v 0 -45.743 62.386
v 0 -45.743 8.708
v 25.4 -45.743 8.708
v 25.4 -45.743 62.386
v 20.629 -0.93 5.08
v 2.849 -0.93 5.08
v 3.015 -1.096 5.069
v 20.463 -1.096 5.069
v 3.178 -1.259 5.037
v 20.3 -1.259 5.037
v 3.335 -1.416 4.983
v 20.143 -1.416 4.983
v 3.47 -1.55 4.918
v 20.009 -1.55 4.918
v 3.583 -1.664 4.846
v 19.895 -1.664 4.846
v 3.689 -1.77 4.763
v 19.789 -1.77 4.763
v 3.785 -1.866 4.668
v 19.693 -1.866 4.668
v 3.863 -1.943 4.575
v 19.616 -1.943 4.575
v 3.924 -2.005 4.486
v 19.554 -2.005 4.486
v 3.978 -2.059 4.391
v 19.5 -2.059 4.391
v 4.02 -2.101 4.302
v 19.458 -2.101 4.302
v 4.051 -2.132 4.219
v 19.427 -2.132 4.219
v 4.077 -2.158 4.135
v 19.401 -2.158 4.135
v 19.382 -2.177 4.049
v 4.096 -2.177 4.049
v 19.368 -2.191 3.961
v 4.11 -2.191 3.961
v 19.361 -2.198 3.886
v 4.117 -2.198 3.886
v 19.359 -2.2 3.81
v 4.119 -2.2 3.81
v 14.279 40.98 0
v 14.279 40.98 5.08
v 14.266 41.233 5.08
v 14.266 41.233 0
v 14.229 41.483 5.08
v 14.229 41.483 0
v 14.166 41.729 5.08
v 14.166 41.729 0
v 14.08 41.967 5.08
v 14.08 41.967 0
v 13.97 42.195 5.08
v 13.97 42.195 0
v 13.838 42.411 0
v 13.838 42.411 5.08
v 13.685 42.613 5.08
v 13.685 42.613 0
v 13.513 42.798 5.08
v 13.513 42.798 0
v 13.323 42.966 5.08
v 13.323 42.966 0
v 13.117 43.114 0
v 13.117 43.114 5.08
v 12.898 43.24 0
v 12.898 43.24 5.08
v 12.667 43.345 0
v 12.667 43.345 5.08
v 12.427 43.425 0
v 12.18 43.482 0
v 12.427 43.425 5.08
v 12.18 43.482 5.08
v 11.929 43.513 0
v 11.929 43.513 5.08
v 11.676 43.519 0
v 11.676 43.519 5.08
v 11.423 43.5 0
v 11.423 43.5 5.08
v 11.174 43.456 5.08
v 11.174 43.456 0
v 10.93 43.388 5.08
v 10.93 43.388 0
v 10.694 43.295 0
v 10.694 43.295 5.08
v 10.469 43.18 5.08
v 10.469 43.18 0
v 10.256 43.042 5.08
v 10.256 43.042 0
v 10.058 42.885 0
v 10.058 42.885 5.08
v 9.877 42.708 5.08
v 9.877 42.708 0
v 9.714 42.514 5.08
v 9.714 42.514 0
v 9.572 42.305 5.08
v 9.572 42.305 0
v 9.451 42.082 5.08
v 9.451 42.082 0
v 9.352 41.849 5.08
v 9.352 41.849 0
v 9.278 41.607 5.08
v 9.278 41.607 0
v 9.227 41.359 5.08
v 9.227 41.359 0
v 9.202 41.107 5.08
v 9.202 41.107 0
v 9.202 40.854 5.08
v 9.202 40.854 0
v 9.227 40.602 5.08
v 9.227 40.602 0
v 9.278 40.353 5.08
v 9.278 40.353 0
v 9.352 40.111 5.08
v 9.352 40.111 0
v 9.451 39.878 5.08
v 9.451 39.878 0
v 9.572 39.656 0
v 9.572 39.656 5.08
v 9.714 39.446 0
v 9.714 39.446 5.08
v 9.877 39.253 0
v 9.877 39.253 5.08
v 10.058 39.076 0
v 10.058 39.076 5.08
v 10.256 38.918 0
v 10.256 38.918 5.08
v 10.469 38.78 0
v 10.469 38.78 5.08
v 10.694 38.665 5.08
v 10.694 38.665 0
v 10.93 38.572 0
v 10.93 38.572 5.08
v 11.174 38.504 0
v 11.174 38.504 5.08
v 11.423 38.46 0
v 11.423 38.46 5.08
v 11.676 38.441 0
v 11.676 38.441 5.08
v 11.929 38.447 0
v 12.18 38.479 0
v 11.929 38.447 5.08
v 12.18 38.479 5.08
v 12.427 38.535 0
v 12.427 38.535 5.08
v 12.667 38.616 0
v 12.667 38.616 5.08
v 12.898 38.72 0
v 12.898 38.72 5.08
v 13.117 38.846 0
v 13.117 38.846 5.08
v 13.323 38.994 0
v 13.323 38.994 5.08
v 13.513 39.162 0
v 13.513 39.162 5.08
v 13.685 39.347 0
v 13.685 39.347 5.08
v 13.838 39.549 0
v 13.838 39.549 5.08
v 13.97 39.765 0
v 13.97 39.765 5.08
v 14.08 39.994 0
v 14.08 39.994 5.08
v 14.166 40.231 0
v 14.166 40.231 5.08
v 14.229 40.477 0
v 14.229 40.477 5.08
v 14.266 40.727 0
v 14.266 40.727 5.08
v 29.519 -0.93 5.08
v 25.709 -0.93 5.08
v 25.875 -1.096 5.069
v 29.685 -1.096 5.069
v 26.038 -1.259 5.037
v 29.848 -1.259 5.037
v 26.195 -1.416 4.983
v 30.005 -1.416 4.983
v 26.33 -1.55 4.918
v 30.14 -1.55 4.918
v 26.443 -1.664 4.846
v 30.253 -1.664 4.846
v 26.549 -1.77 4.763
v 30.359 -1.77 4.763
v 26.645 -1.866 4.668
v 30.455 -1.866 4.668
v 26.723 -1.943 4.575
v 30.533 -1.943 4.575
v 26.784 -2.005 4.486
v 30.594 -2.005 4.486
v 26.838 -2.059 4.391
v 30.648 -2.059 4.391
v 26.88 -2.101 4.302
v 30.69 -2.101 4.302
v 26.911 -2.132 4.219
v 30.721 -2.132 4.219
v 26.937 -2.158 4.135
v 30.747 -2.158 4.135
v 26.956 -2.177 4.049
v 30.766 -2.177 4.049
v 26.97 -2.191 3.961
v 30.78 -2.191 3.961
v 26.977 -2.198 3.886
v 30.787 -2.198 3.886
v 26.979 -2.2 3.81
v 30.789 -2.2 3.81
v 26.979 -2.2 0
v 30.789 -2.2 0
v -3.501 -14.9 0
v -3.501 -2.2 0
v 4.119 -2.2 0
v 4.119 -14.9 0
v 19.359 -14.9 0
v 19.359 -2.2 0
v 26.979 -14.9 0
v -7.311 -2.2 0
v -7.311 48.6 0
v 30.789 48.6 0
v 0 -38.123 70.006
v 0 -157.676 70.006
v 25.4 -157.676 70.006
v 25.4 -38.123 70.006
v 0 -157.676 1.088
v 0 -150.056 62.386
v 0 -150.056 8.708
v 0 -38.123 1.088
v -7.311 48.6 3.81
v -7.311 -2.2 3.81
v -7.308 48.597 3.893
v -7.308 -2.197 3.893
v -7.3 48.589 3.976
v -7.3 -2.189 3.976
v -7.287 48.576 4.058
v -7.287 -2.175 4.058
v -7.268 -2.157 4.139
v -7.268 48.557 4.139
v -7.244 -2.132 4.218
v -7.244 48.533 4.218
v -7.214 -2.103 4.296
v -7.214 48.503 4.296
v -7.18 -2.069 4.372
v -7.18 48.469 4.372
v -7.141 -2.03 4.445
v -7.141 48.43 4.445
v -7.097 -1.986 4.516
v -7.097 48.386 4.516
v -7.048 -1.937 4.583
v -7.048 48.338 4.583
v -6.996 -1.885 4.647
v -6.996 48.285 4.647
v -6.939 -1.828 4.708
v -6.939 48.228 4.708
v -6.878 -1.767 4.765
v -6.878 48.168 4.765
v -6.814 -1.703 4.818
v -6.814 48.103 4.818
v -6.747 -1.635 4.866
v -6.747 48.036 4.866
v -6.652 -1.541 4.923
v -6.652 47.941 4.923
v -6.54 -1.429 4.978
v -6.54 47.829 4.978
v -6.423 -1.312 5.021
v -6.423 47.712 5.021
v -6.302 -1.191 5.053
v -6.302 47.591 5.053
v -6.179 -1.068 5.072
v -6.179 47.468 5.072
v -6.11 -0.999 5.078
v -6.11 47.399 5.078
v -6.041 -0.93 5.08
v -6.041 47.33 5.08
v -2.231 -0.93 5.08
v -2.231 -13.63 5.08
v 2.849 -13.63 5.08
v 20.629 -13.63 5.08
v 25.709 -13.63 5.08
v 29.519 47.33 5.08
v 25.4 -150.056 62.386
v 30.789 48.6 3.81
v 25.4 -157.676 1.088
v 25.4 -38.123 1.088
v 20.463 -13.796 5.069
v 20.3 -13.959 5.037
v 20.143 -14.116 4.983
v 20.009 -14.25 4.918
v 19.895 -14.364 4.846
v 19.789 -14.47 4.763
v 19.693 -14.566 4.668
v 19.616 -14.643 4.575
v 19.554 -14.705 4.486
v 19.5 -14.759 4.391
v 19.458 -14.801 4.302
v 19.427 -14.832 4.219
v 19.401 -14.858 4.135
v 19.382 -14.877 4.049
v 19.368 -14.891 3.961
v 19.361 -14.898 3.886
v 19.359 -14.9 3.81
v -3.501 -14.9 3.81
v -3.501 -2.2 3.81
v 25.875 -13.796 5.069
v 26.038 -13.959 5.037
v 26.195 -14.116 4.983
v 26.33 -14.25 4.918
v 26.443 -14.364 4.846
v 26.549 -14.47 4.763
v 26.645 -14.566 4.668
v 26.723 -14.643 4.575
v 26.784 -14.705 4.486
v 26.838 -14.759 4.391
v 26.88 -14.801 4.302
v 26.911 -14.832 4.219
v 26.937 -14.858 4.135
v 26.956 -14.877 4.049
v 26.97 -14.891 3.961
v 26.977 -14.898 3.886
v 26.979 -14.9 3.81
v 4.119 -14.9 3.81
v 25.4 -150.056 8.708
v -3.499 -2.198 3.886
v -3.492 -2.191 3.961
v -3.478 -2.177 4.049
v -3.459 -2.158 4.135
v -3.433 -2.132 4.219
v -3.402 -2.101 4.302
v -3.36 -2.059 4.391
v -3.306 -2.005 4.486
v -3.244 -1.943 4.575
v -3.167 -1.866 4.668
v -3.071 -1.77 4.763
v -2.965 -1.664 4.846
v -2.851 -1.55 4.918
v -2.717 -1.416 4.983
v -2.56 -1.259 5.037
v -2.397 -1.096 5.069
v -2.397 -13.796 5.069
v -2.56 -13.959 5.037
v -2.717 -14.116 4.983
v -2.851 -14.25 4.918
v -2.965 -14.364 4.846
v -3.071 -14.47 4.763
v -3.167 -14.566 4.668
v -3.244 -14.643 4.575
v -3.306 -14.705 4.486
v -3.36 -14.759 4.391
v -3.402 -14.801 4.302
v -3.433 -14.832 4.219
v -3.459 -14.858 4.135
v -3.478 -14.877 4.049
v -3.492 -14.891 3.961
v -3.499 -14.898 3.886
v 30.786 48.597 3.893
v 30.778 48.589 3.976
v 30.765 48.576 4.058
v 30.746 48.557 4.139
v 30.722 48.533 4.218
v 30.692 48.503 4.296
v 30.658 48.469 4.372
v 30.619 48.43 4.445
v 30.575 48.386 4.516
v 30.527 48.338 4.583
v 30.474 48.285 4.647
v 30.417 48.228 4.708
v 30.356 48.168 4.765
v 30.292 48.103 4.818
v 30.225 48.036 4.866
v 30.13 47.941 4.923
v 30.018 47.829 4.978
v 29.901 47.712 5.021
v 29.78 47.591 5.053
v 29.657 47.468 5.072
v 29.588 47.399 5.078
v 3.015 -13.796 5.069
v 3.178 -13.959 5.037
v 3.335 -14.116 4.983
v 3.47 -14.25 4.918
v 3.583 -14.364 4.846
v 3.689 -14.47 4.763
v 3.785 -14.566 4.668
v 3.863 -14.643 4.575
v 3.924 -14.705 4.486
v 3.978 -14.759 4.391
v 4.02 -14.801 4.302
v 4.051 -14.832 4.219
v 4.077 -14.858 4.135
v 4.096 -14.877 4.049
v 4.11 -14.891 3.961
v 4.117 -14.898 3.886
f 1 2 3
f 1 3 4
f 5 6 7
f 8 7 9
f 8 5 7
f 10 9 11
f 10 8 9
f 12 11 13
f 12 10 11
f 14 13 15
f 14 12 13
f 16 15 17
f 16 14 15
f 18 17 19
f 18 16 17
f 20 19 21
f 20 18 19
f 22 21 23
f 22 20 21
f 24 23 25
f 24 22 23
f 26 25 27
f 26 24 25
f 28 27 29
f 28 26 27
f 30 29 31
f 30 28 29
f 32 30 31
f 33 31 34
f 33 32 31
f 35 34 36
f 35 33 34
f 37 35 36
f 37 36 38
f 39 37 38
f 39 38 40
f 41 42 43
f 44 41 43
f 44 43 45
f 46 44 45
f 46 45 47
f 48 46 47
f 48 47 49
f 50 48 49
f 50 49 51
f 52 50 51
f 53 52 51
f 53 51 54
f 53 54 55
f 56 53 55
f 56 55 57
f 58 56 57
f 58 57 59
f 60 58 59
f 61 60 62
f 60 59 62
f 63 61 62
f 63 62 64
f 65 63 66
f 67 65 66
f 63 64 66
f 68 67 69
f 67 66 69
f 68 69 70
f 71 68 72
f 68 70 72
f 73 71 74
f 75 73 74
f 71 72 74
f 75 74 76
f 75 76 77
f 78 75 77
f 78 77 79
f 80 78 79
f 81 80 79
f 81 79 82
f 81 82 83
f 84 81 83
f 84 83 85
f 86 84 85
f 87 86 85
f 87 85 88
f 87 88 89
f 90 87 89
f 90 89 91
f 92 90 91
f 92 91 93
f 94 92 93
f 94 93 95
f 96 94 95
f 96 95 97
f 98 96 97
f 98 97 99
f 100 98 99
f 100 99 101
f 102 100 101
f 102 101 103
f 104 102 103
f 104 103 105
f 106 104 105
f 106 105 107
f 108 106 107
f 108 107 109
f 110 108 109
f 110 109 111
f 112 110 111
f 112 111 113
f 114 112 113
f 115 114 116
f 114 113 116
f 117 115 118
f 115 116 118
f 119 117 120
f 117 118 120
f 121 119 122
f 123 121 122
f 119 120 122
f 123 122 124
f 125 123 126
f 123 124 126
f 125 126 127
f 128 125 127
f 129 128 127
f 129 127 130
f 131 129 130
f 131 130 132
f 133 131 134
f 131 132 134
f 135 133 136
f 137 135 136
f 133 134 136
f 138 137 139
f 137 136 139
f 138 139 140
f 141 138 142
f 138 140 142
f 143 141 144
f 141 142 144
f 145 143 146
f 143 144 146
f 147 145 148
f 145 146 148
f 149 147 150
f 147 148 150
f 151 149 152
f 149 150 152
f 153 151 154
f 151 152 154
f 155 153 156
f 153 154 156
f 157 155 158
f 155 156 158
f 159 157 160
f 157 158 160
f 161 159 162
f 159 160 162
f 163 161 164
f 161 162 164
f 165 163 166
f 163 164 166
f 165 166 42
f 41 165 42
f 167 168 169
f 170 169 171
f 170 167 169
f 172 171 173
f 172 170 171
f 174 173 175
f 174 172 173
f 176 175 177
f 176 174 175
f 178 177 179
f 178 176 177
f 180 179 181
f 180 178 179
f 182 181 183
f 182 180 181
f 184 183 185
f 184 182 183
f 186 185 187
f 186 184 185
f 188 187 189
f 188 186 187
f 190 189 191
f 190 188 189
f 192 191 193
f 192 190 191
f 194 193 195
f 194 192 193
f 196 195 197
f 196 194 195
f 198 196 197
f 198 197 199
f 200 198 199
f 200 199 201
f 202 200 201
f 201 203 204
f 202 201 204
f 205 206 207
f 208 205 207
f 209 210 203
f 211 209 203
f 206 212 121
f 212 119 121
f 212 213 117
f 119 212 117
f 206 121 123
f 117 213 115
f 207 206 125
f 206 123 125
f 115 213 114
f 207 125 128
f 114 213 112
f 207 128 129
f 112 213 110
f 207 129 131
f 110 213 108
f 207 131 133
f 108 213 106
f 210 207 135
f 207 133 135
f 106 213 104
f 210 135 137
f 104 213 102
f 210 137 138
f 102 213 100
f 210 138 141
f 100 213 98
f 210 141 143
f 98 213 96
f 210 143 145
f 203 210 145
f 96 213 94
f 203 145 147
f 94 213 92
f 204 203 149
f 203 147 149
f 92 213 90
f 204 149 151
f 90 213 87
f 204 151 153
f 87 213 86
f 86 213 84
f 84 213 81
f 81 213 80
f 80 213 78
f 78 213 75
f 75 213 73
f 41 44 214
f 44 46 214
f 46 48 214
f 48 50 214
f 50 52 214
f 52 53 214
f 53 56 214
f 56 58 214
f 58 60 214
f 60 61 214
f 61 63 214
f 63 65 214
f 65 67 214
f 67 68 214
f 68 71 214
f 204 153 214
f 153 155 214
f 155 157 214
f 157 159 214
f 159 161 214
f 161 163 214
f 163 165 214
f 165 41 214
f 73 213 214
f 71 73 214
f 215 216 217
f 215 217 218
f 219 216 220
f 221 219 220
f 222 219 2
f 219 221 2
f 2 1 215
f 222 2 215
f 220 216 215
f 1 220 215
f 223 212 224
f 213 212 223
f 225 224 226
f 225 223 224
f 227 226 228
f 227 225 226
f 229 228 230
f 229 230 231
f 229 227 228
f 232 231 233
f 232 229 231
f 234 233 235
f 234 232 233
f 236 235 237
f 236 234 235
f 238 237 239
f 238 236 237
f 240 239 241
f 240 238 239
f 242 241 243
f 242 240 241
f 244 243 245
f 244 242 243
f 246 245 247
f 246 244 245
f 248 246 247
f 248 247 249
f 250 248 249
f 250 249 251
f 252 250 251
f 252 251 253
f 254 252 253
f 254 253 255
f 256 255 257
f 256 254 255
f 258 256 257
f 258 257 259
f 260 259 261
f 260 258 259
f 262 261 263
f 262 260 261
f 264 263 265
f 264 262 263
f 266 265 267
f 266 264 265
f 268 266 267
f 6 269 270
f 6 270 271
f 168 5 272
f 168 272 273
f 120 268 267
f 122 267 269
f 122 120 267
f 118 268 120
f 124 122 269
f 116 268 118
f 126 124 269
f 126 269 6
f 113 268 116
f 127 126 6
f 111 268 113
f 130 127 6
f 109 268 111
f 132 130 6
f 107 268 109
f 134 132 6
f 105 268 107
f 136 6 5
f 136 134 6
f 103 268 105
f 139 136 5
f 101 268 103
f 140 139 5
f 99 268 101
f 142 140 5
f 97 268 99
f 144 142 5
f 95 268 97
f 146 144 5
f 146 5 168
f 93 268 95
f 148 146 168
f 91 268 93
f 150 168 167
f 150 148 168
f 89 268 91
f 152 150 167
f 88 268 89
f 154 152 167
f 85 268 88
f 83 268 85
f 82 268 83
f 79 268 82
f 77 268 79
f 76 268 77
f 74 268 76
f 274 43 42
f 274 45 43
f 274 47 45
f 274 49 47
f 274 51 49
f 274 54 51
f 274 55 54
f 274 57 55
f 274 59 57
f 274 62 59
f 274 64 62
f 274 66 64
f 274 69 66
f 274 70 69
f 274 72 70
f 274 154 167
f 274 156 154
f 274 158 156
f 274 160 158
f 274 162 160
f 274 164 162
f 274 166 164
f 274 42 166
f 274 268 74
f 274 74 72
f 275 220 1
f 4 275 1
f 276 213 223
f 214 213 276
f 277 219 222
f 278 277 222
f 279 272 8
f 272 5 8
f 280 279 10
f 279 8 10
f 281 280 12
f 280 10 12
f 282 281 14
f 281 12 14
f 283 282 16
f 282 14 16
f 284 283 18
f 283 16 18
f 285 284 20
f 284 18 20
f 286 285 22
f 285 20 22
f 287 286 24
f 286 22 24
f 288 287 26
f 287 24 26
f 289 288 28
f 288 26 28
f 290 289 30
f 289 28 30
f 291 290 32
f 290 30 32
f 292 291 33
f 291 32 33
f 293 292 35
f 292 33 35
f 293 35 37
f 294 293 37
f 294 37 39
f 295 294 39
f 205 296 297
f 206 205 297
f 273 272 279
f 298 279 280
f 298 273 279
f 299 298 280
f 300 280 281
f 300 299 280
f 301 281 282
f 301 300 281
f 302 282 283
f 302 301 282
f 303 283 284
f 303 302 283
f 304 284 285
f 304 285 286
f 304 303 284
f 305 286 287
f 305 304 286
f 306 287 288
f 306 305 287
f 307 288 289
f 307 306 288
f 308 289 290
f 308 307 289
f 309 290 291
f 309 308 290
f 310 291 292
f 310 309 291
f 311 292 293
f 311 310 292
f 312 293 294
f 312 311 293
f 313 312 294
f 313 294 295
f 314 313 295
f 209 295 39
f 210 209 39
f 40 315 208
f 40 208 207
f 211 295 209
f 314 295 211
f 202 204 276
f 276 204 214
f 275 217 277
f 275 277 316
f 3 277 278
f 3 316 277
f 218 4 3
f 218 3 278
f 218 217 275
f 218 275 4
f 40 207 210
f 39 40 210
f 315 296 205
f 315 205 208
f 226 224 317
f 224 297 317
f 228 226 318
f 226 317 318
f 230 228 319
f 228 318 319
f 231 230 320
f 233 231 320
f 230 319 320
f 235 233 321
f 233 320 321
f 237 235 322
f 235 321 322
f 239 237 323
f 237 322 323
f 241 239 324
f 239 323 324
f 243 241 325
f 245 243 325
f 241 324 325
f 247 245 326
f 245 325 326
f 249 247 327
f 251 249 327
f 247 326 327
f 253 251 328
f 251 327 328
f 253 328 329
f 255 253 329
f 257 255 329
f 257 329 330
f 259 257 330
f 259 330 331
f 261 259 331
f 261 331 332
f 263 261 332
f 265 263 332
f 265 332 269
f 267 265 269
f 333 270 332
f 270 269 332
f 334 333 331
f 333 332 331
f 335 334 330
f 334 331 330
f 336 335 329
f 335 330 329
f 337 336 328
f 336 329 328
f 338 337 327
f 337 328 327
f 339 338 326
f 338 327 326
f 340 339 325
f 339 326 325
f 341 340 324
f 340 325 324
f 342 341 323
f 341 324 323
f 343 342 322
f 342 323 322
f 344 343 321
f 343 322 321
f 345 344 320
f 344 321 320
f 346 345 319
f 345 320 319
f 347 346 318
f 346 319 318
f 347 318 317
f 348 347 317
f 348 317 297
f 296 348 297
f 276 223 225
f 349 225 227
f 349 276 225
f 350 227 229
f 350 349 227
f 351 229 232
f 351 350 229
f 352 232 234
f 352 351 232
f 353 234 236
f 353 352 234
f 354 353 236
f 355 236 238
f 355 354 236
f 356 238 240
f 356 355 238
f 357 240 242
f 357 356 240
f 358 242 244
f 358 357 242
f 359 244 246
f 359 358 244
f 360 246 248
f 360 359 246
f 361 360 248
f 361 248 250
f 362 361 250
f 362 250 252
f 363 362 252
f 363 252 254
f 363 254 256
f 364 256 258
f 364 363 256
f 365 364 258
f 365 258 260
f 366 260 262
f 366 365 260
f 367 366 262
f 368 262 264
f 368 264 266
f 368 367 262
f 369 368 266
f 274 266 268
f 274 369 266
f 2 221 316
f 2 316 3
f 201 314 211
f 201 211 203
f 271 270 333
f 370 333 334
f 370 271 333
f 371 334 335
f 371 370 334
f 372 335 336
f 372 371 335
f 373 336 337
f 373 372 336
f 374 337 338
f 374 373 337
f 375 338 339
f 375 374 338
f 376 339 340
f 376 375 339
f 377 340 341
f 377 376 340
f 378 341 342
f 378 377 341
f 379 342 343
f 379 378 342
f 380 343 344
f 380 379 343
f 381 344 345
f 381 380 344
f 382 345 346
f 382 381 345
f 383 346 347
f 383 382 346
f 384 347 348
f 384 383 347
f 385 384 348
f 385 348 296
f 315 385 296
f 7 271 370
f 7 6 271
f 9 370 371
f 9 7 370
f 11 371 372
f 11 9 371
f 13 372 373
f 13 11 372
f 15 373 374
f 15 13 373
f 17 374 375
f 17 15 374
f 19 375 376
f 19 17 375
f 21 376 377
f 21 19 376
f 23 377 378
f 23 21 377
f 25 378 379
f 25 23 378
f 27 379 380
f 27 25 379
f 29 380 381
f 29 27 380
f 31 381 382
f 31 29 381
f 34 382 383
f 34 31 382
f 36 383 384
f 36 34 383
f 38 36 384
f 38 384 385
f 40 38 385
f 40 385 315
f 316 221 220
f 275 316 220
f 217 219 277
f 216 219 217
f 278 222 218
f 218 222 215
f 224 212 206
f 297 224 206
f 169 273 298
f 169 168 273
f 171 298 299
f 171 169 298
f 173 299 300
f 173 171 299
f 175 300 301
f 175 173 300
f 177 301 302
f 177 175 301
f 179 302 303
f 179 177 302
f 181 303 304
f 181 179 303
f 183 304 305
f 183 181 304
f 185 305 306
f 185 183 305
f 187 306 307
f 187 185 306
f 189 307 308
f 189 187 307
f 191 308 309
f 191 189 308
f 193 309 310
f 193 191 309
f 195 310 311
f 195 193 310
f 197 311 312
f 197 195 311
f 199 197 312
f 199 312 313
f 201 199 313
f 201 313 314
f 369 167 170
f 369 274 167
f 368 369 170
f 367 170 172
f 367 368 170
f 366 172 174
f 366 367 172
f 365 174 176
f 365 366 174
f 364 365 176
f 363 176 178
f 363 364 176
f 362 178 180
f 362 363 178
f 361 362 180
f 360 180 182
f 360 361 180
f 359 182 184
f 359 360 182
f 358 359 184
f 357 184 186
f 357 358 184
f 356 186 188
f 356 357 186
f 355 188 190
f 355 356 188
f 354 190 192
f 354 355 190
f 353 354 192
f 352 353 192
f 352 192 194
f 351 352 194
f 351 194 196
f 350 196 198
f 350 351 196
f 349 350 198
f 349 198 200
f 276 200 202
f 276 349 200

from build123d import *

# Parameters (mm, degrees)
F0_W     = 38.1
F0_H     = 50.8
F1_DEPTH = 5.08
F2_R     = 2.54
F3_DEPTH = 5.081
F4_W     = 7.62
F4_H     = 12.7
F5_DEPTH = 5.08
F6_R     = 1.27
F7_W     = 119.5536076081
F7_H     = 68.9181420021
F7_W_2   = 104.3136076081
F7_H_2   = 53.6781420021
F8_DEPTH = 25.4


with BuildPart() as f1:
    # F0 (on Top) → F1 (new body)
    with BuildSketch(Plane.XY):
        with Locations((11.7390617564, 23.2001445636)):
            Rectangle(F0_W, F0_H)
    extrude(amount=F1_DEPTH)

    # F2 (on face) → F3 (cut, through all)
    with BuildSketch(Plane.XY.offset(5.08)):
        with Locations((11.7390617564, 40.9801445636)):
            Circle(F2_R)
    extrude(amount=-F3_DEPTH, mode=Mode.SUBTRACT)

    # F4 (on face) → F5 (join, through all)
    with BuildSketch(Plane.XY.offset(5.08)):
        with Locations((23.1690617564, -8.5498554364)):
            Rectangle(F4_W, F4_H)
        with Locations((0.3090617564, -8.5498554364)):
            Rectangle(F4_W, F4_H)
    extrude(amount=-F5_DEPTH)

    # F6
    f6_edges = [f1.edges().sort_by_distance(p)[0] for p in [
        (-7.310938, 23.200145, 5.08),
        (11.739062, 48.600145, 5.08),
        (30.789062, 23.200145, 5.08),
        (28.884062, -2.199855, 5.08),
        (23.169062, -14.899855, 5.08),
        (19.359062, -8.549855, 5.08),
        (11.739062, -2.199855, 5.08),
        (4.119062, -8.549855, 5.08),
        (-3.500938, -8.549855, 5.08),
        (-5.405938, -2.199855, 5.08),
        (0.309062, -14.899855, 5.08),
        (26.979062, -8.549855, 5.08),
    ]]
    fillet(f6_edges, radius=F6_R)


with BuildPart() as f8:
    # F7 (on Right) → F8 (new body)
    with BuildSketch(Plane.YZ):
        with Locations((-97.8994980925, 35.5466438923)):
            Rectangle(F7_W, F7_H)
        with Locations((-97.8994980925, 35.5466438923)):
            Rectangle(F7_W_2, F7_H_2, mode=Mode.SUBTRACT)
    extrude(amount=F8_DEPTH)


solid = Compound([f1.part, f8.part])
